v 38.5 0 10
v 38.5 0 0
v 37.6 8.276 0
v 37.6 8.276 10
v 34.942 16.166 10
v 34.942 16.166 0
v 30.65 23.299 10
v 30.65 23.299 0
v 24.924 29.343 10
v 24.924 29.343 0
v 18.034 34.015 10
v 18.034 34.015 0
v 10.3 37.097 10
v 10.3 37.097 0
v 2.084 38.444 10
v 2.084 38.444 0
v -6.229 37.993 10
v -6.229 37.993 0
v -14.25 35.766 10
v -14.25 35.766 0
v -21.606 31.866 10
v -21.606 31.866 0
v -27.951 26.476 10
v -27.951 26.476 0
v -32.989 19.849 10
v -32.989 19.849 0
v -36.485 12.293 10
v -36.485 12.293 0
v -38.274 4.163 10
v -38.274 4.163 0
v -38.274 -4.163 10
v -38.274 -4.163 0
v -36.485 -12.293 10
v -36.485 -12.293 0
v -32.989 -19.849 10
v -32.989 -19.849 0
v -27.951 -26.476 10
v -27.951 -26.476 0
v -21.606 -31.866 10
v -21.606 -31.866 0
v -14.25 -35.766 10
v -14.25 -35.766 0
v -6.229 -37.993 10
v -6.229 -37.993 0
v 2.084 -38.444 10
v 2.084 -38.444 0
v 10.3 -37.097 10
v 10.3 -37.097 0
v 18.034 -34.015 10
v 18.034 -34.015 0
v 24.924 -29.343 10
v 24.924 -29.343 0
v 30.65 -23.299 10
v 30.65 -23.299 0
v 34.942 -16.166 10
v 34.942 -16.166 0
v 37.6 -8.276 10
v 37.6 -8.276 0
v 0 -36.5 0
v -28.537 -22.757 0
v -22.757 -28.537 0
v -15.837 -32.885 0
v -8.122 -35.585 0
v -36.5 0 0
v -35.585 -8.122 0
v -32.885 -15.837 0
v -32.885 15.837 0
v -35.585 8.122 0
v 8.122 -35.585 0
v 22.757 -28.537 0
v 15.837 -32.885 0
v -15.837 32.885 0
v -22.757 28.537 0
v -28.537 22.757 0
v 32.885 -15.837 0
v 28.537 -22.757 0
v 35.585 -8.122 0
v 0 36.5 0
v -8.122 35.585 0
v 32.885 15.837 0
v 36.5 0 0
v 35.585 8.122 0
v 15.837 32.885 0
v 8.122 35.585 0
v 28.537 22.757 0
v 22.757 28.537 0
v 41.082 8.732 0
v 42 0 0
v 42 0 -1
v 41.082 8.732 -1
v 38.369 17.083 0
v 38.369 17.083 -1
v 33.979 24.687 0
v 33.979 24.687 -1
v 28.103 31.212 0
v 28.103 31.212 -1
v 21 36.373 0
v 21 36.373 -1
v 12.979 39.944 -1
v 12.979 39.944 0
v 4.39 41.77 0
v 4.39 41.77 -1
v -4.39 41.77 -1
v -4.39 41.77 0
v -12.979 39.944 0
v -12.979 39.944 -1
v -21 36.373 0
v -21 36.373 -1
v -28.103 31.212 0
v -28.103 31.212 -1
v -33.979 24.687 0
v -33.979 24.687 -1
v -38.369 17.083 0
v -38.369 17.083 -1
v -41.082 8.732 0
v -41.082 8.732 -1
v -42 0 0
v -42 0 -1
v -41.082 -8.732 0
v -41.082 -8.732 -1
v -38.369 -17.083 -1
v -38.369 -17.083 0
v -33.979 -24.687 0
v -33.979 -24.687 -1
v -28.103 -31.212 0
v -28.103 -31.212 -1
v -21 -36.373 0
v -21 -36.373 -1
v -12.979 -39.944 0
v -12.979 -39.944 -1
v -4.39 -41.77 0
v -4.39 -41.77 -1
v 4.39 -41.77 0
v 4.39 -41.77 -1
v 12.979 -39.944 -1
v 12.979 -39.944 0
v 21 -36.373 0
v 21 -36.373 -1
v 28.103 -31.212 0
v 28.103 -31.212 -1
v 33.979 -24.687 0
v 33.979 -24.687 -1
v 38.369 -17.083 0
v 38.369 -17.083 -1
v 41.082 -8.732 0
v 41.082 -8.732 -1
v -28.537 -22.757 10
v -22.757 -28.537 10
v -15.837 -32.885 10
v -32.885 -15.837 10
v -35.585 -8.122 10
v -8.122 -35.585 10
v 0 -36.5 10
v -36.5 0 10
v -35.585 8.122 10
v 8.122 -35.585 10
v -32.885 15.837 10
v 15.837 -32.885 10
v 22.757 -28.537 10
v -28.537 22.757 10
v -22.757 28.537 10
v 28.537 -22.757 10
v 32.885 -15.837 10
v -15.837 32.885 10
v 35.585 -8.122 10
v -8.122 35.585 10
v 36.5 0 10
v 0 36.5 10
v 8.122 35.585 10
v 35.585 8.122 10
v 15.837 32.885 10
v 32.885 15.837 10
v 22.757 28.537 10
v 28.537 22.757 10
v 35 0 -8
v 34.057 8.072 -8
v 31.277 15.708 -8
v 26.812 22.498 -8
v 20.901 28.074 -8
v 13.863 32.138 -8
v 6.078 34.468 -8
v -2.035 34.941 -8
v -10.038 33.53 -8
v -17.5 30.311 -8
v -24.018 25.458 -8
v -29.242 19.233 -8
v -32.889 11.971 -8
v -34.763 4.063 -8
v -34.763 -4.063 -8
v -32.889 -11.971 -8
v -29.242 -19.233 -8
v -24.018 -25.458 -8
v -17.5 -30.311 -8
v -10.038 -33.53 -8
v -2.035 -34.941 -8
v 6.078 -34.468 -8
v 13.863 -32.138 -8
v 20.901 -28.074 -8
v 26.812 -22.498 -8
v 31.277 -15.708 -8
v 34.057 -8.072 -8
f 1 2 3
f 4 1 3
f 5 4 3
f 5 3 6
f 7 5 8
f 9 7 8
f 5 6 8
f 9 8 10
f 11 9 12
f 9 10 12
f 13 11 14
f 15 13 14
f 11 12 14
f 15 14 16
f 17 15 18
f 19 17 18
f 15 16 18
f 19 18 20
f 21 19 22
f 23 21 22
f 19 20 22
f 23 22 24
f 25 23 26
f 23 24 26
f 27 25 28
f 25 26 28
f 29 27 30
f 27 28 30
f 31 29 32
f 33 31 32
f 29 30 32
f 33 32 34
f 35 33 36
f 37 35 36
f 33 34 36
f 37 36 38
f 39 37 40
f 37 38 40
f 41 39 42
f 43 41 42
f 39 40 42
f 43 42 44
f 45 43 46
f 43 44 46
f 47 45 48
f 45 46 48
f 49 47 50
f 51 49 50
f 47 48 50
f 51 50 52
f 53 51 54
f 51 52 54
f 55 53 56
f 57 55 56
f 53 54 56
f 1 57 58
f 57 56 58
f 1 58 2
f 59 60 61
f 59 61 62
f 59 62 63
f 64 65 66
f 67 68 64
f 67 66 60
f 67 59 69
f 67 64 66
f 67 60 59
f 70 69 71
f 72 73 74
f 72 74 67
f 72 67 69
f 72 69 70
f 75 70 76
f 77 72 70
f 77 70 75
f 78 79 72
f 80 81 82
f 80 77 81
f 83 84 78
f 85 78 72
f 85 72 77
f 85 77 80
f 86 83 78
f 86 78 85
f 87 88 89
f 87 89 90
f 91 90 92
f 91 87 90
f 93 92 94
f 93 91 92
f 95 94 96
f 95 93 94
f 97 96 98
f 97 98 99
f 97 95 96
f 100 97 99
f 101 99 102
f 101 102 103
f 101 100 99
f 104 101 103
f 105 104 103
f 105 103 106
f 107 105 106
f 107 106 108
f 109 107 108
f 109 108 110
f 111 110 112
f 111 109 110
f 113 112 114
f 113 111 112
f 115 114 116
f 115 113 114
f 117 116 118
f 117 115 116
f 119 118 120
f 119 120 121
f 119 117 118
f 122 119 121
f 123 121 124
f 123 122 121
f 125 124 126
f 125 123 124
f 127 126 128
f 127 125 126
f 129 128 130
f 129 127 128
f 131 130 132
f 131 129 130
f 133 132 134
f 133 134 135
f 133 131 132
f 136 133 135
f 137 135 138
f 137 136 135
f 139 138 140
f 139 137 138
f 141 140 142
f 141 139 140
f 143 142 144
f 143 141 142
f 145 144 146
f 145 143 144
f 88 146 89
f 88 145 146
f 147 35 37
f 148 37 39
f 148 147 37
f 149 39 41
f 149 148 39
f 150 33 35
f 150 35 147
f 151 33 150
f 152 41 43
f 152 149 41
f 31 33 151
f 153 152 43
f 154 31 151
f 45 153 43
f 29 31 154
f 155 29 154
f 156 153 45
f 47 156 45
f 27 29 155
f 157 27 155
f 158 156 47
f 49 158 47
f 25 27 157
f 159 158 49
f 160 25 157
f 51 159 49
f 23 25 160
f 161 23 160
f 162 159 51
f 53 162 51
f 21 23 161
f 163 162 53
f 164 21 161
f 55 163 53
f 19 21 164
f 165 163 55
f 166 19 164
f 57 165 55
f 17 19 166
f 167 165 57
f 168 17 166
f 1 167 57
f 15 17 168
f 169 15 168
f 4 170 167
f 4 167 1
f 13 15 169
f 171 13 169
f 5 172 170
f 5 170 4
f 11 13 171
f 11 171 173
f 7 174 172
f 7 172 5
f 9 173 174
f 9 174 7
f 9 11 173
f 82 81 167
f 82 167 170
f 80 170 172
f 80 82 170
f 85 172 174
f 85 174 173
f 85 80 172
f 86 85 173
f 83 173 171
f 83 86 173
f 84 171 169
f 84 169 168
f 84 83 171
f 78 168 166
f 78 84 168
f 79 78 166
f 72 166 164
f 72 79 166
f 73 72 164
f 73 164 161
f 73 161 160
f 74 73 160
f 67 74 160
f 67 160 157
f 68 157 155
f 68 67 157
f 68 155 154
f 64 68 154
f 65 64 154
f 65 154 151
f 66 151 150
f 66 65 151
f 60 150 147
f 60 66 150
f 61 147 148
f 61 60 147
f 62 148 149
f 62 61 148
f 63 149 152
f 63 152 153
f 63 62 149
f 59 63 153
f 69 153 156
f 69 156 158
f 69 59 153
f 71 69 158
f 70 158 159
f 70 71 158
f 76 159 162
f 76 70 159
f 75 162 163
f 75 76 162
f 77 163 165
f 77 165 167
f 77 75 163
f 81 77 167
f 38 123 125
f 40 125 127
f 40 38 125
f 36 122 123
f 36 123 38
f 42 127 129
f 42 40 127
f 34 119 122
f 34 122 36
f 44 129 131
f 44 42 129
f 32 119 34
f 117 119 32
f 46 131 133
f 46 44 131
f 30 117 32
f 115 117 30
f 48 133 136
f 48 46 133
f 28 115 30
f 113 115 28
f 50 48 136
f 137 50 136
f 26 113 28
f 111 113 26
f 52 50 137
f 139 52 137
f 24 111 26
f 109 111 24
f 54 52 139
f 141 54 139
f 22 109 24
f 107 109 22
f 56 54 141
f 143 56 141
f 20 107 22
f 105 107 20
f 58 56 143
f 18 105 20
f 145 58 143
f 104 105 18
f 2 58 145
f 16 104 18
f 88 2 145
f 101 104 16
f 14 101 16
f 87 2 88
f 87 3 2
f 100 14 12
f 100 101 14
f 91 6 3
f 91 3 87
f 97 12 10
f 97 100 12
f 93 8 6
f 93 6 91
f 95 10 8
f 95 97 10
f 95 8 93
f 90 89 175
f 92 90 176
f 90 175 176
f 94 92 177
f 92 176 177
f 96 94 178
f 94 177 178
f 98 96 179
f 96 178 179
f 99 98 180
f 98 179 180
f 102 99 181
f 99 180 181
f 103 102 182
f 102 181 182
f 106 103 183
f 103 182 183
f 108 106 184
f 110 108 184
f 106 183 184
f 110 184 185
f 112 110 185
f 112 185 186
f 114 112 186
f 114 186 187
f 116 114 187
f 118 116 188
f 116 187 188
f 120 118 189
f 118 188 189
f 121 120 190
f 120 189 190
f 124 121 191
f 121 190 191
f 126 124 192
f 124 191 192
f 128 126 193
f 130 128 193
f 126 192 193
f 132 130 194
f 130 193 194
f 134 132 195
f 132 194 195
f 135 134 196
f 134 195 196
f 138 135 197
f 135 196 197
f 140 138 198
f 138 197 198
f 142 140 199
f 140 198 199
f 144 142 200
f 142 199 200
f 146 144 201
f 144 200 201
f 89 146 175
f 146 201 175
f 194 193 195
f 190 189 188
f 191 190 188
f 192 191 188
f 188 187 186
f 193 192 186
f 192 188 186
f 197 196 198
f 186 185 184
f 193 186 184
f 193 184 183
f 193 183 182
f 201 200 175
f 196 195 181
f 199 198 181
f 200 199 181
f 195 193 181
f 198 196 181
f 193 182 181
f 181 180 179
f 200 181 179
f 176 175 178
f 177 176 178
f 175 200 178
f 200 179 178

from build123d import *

# Parameters (mm, degrees)
F0_R     = 38.5
F0_R_2   = 36.5
F1_DEPTH = 10
F2_R     = 42
F3_DEPTH = 8
F4_SIZE  = 7


with BuildPart() as f1:
    # F0 (on Top) → F1 (new body)
    with BuildSketch(Plane.XY):
        Circle(F0_R)
        Circle(F0_R_2, mode=Mode.SUBTRACT)
    extrude(amount=F1_DEPTH)

    # F2 (on Top) → F3 (join)
    with BuildSketch(Plane.XY):
        Circle(F2_R)
    extrude(amount=-F3_DEPTH)

    # F4
    f4_edges = [f1.edges().sort_by_distance(p)[0] for p in [
        (-42, 0, -8),
    ]]
    chamfer(f4_edges, length=F4_SIZE)


solid = f1.part
